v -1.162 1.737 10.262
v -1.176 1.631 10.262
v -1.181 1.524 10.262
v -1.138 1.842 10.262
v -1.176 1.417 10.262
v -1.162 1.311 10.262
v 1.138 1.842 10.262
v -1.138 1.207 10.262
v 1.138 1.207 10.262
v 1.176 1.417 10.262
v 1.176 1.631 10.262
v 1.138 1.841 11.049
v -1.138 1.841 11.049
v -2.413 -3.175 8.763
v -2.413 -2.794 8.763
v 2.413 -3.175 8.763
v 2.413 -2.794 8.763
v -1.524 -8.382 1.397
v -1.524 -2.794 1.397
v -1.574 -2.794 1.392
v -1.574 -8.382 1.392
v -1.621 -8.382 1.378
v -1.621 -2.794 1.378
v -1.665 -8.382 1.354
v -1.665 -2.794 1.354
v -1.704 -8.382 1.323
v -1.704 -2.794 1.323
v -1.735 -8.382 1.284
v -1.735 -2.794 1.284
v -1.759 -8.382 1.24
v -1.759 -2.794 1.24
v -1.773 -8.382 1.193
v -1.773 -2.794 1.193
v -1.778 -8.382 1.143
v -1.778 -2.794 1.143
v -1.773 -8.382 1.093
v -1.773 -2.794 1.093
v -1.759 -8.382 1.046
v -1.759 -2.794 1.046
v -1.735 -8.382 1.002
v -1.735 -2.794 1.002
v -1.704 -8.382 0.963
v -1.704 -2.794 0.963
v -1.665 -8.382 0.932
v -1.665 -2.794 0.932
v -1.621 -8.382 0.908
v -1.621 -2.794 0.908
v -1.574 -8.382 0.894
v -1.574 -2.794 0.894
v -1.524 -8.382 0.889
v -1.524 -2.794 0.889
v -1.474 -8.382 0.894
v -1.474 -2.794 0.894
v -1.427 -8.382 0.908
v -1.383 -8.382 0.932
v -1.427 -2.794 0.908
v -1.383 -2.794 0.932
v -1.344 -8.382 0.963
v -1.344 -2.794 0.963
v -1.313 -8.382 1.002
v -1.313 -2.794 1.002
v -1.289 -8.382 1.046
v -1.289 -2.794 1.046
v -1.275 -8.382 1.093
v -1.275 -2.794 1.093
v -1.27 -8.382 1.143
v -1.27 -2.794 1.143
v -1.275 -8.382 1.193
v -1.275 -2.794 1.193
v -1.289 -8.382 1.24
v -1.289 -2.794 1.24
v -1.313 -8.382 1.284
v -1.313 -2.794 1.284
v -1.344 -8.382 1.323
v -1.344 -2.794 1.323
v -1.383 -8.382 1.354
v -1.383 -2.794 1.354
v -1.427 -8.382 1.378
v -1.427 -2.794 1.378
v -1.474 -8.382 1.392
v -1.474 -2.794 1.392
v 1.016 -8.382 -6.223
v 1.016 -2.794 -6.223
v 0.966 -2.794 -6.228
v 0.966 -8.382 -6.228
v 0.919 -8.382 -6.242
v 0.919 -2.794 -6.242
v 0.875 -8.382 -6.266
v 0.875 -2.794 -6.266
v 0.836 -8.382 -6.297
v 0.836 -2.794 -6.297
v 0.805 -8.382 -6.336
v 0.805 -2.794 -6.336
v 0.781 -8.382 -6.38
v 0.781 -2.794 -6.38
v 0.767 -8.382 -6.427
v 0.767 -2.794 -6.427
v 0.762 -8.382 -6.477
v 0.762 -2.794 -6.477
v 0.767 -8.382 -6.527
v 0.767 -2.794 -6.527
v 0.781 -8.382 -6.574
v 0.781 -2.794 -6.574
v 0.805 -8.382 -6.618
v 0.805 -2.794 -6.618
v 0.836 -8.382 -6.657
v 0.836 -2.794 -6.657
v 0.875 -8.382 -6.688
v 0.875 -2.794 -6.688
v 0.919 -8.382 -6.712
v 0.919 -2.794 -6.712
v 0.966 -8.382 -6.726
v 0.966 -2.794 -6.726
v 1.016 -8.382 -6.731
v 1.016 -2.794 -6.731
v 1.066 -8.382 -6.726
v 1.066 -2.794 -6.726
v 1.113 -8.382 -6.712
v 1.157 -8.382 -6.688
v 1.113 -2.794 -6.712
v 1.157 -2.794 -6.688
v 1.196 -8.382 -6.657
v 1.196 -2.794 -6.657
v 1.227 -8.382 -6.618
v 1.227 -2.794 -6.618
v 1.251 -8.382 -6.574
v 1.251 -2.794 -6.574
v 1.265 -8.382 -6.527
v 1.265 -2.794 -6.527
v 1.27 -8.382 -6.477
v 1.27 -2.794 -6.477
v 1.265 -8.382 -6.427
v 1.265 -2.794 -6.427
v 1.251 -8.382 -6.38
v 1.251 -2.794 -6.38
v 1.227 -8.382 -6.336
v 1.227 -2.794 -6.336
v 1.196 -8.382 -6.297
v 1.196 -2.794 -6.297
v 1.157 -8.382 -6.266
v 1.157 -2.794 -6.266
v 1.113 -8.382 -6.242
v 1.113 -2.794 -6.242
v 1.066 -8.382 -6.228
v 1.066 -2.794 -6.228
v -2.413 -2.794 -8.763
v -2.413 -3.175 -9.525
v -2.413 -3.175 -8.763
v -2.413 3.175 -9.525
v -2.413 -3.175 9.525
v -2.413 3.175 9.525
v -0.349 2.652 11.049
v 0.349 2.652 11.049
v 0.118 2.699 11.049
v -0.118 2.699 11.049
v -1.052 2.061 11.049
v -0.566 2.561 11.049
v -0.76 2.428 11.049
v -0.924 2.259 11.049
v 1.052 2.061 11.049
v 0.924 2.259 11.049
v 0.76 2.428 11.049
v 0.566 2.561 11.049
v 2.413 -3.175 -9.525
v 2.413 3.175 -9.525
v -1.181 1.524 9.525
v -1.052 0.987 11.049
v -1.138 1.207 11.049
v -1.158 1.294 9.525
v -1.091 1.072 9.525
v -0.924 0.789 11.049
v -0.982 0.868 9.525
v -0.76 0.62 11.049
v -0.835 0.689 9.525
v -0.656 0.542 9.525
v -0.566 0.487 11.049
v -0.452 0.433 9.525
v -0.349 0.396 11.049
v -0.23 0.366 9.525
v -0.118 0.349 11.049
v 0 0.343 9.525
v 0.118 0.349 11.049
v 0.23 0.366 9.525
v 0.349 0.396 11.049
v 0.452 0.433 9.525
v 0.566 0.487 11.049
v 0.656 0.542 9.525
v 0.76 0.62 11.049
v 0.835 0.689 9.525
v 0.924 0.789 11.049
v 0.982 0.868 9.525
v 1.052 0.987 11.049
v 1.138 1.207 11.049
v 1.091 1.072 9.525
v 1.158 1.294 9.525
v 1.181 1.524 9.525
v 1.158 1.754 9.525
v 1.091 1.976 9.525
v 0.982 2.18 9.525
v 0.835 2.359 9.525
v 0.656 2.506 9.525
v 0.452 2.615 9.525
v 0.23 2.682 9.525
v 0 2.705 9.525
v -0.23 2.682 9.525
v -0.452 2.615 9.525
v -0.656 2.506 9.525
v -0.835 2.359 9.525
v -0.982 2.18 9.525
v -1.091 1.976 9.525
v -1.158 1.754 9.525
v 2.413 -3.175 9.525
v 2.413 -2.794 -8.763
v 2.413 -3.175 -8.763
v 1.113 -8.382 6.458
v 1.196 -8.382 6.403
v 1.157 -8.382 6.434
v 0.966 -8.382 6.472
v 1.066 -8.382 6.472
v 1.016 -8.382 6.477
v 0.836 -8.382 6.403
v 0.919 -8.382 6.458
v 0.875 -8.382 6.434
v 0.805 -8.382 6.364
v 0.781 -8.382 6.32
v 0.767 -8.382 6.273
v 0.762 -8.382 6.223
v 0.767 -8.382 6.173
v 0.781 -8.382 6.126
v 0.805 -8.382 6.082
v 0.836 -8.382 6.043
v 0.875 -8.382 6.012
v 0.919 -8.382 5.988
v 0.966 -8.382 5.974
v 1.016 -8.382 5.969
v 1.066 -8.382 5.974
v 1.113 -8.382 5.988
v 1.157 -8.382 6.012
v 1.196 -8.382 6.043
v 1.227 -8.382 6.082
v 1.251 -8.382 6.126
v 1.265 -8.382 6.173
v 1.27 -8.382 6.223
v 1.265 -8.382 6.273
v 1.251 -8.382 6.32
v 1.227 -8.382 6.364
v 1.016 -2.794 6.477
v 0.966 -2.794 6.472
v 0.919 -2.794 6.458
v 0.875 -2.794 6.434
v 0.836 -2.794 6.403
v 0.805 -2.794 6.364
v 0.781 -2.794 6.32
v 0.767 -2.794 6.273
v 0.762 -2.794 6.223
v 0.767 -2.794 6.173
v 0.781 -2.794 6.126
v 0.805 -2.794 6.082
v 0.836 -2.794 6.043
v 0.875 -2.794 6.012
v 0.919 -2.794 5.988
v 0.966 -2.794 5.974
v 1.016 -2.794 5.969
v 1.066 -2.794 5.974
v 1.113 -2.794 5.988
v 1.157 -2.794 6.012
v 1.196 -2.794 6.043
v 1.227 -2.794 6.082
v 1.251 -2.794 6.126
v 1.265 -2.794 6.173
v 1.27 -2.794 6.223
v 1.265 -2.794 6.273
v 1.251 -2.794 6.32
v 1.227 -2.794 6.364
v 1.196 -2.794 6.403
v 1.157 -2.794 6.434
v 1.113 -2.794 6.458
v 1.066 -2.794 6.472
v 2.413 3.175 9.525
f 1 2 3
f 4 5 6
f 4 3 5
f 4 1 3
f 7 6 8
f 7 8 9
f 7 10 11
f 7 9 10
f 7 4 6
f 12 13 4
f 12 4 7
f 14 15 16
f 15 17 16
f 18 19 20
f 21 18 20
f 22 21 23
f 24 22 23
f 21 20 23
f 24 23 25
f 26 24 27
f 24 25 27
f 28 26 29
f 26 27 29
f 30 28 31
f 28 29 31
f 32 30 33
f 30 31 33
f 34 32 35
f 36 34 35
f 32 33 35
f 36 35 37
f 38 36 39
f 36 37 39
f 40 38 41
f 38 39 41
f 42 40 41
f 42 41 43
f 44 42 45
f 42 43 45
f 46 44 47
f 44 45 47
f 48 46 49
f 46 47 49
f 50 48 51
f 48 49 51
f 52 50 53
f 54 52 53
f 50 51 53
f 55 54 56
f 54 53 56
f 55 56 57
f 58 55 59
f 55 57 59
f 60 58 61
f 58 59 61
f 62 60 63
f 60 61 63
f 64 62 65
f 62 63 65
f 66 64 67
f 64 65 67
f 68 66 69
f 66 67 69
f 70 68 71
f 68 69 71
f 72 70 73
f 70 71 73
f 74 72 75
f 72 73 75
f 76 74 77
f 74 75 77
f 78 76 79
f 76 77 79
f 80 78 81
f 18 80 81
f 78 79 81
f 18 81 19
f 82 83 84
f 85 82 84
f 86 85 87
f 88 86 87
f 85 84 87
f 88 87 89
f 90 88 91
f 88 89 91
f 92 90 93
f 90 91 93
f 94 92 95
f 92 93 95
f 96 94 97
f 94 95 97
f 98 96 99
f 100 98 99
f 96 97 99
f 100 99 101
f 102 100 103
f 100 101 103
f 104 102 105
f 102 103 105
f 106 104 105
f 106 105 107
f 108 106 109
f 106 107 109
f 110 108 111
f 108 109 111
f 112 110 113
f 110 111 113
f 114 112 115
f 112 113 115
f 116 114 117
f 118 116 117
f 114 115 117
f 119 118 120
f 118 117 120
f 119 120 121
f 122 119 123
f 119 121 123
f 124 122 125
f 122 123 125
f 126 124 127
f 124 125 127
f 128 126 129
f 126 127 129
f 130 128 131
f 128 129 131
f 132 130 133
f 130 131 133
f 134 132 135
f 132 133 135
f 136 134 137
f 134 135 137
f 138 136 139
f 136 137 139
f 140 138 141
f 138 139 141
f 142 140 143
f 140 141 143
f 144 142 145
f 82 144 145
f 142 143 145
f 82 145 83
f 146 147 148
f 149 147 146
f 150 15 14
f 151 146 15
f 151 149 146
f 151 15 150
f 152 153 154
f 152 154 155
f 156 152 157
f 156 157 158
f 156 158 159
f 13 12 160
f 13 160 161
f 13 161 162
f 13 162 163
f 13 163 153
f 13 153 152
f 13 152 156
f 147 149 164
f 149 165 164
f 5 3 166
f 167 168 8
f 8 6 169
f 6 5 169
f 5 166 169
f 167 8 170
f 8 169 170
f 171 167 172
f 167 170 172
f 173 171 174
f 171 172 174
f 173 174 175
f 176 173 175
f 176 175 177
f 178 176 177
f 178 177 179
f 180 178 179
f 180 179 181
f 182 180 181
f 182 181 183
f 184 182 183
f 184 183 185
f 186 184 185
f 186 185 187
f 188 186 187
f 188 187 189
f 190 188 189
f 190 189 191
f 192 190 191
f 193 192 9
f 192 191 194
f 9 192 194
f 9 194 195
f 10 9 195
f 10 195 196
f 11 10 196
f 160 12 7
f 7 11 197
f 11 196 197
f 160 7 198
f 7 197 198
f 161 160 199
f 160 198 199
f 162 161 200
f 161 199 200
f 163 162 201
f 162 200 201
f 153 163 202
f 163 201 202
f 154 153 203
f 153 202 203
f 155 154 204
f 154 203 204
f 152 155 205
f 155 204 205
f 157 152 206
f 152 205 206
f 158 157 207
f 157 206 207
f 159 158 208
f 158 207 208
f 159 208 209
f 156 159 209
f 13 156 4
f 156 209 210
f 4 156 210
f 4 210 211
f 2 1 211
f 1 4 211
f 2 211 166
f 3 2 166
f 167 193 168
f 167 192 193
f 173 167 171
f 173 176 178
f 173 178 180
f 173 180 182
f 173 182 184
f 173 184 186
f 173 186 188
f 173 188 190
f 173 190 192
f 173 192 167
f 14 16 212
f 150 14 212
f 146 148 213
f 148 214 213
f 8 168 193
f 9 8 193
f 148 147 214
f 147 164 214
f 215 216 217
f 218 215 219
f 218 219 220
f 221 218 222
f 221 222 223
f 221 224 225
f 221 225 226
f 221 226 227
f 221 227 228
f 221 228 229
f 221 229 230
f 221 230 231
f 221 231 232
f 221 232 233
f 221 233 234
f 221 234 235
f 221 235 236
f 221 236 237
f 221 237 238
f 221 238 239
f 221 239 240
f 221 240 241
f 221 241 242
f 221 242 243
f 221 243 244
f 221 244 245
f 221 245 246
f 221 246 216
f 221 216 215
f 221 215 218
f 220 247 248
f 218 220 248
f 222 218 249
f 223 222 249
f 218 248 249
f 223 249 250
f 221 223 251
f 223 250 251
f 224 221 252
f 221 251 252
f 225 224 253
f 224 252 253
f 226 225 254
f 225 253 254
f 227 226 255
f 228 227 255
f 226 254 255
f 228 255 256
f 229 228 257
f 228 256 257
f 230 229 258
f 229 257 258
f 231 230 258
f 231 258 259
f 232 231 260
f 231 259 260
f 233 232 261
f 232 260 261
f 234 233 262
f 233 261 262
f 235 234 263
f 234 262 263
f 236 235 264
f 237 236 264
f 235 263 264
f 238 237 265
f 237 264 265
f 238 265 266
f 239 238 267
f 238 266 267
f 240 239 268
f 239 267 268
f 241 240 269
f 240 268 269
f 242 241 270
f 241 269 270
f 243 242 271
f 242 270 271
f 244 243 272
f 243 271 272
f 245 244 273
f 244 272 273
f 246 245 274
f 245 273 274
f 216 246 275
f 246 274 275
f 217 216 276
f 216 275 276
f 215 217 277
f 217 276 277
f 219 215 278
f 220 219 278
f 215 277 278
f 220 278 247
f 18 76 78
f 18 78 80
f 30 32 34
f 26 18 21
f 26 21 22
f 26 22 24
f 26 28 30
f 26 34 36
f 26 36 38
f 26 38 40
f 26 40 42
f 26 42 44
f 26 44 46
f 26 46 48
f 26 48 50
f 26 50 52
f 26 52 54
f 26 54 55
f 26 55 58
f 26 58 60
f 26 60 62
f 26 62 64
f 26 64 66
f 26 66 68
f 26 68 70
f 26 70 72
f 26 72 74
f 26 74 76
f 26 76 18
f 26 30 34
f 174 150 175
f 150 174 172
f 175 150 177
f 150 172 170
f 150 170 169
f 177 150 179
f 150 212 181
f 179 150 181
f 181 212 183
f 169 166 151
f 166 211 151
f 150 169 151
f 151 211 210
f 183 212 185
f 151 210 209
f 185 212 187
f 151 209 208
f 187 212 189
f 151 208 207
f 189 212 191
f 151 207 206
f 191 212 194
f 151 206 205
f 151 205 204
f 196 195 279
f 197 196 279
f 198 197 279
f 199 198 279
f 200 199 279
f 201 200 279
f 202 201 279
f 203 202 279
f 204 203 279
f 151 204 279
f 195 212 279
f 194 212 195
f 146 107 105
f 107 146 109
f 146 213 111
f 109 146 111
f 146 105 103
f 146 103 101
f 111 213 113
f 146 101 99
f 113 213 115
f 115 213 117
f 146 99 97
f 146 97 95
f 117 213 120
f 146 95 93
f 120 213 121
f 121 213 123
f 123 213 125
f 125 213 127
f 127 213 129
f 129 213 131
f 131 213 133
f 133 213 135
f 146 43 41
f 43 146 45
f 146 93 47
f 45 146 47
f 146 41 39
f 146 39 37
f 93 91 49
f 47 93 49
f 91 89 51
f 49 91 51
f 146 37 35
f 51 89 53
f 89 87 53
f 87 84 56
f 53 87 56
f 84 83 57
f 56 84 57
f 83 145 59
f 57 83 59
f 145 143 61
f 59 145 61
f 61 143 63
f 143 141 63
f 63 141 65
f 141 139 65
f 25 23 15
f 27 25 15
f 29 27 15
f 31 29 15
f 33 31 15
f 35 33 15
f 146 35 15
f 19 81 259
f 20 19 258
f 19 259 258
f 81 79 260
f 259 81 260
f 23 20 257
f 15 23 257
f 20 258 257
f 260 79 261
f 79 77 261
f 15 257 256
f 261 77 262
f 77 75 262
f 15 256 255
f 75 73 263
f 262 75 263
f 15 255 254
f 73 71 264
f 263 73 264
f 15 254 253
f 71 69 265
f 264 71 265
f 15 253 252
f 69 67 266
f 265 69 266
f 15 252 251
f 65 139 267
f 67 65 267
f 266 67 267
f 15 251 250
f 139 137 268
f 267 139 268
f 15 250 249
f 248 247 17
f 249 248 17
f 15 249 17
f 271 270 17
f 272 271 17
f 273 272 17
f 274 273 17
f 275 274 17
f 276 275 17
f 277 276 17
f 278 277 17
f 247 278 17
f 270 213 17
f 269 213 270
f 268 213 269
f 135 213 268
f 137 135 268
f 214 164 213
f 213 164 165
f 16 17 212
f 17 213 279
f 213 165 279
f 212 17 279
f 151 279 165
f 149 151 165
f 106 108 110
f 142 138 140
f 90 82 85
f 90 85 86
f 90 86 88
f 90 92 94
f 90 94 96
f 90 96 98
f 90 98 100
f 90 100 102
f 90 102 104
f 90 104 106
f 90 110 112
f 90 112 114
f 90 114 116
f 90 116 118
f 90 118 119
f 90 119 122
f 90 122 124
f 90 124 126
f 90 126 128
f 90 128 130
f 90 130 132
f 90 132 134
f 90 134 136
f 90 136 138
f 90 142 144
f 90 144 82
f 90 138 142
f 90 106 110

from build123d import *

# Parameters (mm, degrees)
EXTRUDE1_DEPTH     = 2.413
SKETCH2_R          = 1.1811
EXTRUDE2_DEPTH     = 1.524
SKETCH3_W          = 3.103966911
SKETCH3_H          = 0.635
CUT_EXTRUDE1_DEPTH = 0.7874
SKETCH4_R          = 0.254
EXTRUDE3_DEPTH     = 5.588


with BuildPart() as part:
    # Sketch1 → Extrude1 (new, symmetric)
    with BuildSketch(Plane(origin=(0, 0, 0), x_dir=(0, 0, -1), z_dir=(1, 0, 0))):
        Polygon((-9.525, 3.175), (9.525, 3.175), (9.525, -3.175), (8.763, -3.175), (8.763, -2.794), (-8.763, -2.794), (-8.763, -3.175), (-9.525, -3.175), align=None)
    extrude(amount=EXTRUDE1_DEPTH, both=True)

    # Sketch2 → Extrude2 (add)
    with BuildSketch(Plane.XY.offset(9.525)):
        with Locations(Location((0, 1.524, 0), (0, 0, 180))):
            Circle(SKETCH2_R)
    extrude(amount=EXTRUDE2_DEPTH)

    # Sketch3 → Cut-Extrude1 (cut)
    with BuildSketch(Plane.XY.offset(11.049)):
        with Locations((-0.005969167, 1.524)):
            Rectangle(SKETCH3_W, SKETCH3_H)
    extrude(amount=-CUT_EXTRUDE1_DEPTH, mode=Mode.SUBTRACT)

    # Sketch4 → Extrude3 (add)
    with BuildSketch(Plane.XZ.offset(2.794)):
        with Locations(Location((1.016, 6.223, 0), (0, 0, 90))):
            Circle(SKETCH4_R)
        with Locations(Location((-1.524, 1.143, 0), (0, 0, 90))):
            Circle(SKETCH4_R)
        with Locations(Location((1.016, -6.477, 0), (0, 0, 90))):
            Circle(SKETCH4_R)
    extrude(amount=EXTRUDE3_DEPTH)


solid = part.part
